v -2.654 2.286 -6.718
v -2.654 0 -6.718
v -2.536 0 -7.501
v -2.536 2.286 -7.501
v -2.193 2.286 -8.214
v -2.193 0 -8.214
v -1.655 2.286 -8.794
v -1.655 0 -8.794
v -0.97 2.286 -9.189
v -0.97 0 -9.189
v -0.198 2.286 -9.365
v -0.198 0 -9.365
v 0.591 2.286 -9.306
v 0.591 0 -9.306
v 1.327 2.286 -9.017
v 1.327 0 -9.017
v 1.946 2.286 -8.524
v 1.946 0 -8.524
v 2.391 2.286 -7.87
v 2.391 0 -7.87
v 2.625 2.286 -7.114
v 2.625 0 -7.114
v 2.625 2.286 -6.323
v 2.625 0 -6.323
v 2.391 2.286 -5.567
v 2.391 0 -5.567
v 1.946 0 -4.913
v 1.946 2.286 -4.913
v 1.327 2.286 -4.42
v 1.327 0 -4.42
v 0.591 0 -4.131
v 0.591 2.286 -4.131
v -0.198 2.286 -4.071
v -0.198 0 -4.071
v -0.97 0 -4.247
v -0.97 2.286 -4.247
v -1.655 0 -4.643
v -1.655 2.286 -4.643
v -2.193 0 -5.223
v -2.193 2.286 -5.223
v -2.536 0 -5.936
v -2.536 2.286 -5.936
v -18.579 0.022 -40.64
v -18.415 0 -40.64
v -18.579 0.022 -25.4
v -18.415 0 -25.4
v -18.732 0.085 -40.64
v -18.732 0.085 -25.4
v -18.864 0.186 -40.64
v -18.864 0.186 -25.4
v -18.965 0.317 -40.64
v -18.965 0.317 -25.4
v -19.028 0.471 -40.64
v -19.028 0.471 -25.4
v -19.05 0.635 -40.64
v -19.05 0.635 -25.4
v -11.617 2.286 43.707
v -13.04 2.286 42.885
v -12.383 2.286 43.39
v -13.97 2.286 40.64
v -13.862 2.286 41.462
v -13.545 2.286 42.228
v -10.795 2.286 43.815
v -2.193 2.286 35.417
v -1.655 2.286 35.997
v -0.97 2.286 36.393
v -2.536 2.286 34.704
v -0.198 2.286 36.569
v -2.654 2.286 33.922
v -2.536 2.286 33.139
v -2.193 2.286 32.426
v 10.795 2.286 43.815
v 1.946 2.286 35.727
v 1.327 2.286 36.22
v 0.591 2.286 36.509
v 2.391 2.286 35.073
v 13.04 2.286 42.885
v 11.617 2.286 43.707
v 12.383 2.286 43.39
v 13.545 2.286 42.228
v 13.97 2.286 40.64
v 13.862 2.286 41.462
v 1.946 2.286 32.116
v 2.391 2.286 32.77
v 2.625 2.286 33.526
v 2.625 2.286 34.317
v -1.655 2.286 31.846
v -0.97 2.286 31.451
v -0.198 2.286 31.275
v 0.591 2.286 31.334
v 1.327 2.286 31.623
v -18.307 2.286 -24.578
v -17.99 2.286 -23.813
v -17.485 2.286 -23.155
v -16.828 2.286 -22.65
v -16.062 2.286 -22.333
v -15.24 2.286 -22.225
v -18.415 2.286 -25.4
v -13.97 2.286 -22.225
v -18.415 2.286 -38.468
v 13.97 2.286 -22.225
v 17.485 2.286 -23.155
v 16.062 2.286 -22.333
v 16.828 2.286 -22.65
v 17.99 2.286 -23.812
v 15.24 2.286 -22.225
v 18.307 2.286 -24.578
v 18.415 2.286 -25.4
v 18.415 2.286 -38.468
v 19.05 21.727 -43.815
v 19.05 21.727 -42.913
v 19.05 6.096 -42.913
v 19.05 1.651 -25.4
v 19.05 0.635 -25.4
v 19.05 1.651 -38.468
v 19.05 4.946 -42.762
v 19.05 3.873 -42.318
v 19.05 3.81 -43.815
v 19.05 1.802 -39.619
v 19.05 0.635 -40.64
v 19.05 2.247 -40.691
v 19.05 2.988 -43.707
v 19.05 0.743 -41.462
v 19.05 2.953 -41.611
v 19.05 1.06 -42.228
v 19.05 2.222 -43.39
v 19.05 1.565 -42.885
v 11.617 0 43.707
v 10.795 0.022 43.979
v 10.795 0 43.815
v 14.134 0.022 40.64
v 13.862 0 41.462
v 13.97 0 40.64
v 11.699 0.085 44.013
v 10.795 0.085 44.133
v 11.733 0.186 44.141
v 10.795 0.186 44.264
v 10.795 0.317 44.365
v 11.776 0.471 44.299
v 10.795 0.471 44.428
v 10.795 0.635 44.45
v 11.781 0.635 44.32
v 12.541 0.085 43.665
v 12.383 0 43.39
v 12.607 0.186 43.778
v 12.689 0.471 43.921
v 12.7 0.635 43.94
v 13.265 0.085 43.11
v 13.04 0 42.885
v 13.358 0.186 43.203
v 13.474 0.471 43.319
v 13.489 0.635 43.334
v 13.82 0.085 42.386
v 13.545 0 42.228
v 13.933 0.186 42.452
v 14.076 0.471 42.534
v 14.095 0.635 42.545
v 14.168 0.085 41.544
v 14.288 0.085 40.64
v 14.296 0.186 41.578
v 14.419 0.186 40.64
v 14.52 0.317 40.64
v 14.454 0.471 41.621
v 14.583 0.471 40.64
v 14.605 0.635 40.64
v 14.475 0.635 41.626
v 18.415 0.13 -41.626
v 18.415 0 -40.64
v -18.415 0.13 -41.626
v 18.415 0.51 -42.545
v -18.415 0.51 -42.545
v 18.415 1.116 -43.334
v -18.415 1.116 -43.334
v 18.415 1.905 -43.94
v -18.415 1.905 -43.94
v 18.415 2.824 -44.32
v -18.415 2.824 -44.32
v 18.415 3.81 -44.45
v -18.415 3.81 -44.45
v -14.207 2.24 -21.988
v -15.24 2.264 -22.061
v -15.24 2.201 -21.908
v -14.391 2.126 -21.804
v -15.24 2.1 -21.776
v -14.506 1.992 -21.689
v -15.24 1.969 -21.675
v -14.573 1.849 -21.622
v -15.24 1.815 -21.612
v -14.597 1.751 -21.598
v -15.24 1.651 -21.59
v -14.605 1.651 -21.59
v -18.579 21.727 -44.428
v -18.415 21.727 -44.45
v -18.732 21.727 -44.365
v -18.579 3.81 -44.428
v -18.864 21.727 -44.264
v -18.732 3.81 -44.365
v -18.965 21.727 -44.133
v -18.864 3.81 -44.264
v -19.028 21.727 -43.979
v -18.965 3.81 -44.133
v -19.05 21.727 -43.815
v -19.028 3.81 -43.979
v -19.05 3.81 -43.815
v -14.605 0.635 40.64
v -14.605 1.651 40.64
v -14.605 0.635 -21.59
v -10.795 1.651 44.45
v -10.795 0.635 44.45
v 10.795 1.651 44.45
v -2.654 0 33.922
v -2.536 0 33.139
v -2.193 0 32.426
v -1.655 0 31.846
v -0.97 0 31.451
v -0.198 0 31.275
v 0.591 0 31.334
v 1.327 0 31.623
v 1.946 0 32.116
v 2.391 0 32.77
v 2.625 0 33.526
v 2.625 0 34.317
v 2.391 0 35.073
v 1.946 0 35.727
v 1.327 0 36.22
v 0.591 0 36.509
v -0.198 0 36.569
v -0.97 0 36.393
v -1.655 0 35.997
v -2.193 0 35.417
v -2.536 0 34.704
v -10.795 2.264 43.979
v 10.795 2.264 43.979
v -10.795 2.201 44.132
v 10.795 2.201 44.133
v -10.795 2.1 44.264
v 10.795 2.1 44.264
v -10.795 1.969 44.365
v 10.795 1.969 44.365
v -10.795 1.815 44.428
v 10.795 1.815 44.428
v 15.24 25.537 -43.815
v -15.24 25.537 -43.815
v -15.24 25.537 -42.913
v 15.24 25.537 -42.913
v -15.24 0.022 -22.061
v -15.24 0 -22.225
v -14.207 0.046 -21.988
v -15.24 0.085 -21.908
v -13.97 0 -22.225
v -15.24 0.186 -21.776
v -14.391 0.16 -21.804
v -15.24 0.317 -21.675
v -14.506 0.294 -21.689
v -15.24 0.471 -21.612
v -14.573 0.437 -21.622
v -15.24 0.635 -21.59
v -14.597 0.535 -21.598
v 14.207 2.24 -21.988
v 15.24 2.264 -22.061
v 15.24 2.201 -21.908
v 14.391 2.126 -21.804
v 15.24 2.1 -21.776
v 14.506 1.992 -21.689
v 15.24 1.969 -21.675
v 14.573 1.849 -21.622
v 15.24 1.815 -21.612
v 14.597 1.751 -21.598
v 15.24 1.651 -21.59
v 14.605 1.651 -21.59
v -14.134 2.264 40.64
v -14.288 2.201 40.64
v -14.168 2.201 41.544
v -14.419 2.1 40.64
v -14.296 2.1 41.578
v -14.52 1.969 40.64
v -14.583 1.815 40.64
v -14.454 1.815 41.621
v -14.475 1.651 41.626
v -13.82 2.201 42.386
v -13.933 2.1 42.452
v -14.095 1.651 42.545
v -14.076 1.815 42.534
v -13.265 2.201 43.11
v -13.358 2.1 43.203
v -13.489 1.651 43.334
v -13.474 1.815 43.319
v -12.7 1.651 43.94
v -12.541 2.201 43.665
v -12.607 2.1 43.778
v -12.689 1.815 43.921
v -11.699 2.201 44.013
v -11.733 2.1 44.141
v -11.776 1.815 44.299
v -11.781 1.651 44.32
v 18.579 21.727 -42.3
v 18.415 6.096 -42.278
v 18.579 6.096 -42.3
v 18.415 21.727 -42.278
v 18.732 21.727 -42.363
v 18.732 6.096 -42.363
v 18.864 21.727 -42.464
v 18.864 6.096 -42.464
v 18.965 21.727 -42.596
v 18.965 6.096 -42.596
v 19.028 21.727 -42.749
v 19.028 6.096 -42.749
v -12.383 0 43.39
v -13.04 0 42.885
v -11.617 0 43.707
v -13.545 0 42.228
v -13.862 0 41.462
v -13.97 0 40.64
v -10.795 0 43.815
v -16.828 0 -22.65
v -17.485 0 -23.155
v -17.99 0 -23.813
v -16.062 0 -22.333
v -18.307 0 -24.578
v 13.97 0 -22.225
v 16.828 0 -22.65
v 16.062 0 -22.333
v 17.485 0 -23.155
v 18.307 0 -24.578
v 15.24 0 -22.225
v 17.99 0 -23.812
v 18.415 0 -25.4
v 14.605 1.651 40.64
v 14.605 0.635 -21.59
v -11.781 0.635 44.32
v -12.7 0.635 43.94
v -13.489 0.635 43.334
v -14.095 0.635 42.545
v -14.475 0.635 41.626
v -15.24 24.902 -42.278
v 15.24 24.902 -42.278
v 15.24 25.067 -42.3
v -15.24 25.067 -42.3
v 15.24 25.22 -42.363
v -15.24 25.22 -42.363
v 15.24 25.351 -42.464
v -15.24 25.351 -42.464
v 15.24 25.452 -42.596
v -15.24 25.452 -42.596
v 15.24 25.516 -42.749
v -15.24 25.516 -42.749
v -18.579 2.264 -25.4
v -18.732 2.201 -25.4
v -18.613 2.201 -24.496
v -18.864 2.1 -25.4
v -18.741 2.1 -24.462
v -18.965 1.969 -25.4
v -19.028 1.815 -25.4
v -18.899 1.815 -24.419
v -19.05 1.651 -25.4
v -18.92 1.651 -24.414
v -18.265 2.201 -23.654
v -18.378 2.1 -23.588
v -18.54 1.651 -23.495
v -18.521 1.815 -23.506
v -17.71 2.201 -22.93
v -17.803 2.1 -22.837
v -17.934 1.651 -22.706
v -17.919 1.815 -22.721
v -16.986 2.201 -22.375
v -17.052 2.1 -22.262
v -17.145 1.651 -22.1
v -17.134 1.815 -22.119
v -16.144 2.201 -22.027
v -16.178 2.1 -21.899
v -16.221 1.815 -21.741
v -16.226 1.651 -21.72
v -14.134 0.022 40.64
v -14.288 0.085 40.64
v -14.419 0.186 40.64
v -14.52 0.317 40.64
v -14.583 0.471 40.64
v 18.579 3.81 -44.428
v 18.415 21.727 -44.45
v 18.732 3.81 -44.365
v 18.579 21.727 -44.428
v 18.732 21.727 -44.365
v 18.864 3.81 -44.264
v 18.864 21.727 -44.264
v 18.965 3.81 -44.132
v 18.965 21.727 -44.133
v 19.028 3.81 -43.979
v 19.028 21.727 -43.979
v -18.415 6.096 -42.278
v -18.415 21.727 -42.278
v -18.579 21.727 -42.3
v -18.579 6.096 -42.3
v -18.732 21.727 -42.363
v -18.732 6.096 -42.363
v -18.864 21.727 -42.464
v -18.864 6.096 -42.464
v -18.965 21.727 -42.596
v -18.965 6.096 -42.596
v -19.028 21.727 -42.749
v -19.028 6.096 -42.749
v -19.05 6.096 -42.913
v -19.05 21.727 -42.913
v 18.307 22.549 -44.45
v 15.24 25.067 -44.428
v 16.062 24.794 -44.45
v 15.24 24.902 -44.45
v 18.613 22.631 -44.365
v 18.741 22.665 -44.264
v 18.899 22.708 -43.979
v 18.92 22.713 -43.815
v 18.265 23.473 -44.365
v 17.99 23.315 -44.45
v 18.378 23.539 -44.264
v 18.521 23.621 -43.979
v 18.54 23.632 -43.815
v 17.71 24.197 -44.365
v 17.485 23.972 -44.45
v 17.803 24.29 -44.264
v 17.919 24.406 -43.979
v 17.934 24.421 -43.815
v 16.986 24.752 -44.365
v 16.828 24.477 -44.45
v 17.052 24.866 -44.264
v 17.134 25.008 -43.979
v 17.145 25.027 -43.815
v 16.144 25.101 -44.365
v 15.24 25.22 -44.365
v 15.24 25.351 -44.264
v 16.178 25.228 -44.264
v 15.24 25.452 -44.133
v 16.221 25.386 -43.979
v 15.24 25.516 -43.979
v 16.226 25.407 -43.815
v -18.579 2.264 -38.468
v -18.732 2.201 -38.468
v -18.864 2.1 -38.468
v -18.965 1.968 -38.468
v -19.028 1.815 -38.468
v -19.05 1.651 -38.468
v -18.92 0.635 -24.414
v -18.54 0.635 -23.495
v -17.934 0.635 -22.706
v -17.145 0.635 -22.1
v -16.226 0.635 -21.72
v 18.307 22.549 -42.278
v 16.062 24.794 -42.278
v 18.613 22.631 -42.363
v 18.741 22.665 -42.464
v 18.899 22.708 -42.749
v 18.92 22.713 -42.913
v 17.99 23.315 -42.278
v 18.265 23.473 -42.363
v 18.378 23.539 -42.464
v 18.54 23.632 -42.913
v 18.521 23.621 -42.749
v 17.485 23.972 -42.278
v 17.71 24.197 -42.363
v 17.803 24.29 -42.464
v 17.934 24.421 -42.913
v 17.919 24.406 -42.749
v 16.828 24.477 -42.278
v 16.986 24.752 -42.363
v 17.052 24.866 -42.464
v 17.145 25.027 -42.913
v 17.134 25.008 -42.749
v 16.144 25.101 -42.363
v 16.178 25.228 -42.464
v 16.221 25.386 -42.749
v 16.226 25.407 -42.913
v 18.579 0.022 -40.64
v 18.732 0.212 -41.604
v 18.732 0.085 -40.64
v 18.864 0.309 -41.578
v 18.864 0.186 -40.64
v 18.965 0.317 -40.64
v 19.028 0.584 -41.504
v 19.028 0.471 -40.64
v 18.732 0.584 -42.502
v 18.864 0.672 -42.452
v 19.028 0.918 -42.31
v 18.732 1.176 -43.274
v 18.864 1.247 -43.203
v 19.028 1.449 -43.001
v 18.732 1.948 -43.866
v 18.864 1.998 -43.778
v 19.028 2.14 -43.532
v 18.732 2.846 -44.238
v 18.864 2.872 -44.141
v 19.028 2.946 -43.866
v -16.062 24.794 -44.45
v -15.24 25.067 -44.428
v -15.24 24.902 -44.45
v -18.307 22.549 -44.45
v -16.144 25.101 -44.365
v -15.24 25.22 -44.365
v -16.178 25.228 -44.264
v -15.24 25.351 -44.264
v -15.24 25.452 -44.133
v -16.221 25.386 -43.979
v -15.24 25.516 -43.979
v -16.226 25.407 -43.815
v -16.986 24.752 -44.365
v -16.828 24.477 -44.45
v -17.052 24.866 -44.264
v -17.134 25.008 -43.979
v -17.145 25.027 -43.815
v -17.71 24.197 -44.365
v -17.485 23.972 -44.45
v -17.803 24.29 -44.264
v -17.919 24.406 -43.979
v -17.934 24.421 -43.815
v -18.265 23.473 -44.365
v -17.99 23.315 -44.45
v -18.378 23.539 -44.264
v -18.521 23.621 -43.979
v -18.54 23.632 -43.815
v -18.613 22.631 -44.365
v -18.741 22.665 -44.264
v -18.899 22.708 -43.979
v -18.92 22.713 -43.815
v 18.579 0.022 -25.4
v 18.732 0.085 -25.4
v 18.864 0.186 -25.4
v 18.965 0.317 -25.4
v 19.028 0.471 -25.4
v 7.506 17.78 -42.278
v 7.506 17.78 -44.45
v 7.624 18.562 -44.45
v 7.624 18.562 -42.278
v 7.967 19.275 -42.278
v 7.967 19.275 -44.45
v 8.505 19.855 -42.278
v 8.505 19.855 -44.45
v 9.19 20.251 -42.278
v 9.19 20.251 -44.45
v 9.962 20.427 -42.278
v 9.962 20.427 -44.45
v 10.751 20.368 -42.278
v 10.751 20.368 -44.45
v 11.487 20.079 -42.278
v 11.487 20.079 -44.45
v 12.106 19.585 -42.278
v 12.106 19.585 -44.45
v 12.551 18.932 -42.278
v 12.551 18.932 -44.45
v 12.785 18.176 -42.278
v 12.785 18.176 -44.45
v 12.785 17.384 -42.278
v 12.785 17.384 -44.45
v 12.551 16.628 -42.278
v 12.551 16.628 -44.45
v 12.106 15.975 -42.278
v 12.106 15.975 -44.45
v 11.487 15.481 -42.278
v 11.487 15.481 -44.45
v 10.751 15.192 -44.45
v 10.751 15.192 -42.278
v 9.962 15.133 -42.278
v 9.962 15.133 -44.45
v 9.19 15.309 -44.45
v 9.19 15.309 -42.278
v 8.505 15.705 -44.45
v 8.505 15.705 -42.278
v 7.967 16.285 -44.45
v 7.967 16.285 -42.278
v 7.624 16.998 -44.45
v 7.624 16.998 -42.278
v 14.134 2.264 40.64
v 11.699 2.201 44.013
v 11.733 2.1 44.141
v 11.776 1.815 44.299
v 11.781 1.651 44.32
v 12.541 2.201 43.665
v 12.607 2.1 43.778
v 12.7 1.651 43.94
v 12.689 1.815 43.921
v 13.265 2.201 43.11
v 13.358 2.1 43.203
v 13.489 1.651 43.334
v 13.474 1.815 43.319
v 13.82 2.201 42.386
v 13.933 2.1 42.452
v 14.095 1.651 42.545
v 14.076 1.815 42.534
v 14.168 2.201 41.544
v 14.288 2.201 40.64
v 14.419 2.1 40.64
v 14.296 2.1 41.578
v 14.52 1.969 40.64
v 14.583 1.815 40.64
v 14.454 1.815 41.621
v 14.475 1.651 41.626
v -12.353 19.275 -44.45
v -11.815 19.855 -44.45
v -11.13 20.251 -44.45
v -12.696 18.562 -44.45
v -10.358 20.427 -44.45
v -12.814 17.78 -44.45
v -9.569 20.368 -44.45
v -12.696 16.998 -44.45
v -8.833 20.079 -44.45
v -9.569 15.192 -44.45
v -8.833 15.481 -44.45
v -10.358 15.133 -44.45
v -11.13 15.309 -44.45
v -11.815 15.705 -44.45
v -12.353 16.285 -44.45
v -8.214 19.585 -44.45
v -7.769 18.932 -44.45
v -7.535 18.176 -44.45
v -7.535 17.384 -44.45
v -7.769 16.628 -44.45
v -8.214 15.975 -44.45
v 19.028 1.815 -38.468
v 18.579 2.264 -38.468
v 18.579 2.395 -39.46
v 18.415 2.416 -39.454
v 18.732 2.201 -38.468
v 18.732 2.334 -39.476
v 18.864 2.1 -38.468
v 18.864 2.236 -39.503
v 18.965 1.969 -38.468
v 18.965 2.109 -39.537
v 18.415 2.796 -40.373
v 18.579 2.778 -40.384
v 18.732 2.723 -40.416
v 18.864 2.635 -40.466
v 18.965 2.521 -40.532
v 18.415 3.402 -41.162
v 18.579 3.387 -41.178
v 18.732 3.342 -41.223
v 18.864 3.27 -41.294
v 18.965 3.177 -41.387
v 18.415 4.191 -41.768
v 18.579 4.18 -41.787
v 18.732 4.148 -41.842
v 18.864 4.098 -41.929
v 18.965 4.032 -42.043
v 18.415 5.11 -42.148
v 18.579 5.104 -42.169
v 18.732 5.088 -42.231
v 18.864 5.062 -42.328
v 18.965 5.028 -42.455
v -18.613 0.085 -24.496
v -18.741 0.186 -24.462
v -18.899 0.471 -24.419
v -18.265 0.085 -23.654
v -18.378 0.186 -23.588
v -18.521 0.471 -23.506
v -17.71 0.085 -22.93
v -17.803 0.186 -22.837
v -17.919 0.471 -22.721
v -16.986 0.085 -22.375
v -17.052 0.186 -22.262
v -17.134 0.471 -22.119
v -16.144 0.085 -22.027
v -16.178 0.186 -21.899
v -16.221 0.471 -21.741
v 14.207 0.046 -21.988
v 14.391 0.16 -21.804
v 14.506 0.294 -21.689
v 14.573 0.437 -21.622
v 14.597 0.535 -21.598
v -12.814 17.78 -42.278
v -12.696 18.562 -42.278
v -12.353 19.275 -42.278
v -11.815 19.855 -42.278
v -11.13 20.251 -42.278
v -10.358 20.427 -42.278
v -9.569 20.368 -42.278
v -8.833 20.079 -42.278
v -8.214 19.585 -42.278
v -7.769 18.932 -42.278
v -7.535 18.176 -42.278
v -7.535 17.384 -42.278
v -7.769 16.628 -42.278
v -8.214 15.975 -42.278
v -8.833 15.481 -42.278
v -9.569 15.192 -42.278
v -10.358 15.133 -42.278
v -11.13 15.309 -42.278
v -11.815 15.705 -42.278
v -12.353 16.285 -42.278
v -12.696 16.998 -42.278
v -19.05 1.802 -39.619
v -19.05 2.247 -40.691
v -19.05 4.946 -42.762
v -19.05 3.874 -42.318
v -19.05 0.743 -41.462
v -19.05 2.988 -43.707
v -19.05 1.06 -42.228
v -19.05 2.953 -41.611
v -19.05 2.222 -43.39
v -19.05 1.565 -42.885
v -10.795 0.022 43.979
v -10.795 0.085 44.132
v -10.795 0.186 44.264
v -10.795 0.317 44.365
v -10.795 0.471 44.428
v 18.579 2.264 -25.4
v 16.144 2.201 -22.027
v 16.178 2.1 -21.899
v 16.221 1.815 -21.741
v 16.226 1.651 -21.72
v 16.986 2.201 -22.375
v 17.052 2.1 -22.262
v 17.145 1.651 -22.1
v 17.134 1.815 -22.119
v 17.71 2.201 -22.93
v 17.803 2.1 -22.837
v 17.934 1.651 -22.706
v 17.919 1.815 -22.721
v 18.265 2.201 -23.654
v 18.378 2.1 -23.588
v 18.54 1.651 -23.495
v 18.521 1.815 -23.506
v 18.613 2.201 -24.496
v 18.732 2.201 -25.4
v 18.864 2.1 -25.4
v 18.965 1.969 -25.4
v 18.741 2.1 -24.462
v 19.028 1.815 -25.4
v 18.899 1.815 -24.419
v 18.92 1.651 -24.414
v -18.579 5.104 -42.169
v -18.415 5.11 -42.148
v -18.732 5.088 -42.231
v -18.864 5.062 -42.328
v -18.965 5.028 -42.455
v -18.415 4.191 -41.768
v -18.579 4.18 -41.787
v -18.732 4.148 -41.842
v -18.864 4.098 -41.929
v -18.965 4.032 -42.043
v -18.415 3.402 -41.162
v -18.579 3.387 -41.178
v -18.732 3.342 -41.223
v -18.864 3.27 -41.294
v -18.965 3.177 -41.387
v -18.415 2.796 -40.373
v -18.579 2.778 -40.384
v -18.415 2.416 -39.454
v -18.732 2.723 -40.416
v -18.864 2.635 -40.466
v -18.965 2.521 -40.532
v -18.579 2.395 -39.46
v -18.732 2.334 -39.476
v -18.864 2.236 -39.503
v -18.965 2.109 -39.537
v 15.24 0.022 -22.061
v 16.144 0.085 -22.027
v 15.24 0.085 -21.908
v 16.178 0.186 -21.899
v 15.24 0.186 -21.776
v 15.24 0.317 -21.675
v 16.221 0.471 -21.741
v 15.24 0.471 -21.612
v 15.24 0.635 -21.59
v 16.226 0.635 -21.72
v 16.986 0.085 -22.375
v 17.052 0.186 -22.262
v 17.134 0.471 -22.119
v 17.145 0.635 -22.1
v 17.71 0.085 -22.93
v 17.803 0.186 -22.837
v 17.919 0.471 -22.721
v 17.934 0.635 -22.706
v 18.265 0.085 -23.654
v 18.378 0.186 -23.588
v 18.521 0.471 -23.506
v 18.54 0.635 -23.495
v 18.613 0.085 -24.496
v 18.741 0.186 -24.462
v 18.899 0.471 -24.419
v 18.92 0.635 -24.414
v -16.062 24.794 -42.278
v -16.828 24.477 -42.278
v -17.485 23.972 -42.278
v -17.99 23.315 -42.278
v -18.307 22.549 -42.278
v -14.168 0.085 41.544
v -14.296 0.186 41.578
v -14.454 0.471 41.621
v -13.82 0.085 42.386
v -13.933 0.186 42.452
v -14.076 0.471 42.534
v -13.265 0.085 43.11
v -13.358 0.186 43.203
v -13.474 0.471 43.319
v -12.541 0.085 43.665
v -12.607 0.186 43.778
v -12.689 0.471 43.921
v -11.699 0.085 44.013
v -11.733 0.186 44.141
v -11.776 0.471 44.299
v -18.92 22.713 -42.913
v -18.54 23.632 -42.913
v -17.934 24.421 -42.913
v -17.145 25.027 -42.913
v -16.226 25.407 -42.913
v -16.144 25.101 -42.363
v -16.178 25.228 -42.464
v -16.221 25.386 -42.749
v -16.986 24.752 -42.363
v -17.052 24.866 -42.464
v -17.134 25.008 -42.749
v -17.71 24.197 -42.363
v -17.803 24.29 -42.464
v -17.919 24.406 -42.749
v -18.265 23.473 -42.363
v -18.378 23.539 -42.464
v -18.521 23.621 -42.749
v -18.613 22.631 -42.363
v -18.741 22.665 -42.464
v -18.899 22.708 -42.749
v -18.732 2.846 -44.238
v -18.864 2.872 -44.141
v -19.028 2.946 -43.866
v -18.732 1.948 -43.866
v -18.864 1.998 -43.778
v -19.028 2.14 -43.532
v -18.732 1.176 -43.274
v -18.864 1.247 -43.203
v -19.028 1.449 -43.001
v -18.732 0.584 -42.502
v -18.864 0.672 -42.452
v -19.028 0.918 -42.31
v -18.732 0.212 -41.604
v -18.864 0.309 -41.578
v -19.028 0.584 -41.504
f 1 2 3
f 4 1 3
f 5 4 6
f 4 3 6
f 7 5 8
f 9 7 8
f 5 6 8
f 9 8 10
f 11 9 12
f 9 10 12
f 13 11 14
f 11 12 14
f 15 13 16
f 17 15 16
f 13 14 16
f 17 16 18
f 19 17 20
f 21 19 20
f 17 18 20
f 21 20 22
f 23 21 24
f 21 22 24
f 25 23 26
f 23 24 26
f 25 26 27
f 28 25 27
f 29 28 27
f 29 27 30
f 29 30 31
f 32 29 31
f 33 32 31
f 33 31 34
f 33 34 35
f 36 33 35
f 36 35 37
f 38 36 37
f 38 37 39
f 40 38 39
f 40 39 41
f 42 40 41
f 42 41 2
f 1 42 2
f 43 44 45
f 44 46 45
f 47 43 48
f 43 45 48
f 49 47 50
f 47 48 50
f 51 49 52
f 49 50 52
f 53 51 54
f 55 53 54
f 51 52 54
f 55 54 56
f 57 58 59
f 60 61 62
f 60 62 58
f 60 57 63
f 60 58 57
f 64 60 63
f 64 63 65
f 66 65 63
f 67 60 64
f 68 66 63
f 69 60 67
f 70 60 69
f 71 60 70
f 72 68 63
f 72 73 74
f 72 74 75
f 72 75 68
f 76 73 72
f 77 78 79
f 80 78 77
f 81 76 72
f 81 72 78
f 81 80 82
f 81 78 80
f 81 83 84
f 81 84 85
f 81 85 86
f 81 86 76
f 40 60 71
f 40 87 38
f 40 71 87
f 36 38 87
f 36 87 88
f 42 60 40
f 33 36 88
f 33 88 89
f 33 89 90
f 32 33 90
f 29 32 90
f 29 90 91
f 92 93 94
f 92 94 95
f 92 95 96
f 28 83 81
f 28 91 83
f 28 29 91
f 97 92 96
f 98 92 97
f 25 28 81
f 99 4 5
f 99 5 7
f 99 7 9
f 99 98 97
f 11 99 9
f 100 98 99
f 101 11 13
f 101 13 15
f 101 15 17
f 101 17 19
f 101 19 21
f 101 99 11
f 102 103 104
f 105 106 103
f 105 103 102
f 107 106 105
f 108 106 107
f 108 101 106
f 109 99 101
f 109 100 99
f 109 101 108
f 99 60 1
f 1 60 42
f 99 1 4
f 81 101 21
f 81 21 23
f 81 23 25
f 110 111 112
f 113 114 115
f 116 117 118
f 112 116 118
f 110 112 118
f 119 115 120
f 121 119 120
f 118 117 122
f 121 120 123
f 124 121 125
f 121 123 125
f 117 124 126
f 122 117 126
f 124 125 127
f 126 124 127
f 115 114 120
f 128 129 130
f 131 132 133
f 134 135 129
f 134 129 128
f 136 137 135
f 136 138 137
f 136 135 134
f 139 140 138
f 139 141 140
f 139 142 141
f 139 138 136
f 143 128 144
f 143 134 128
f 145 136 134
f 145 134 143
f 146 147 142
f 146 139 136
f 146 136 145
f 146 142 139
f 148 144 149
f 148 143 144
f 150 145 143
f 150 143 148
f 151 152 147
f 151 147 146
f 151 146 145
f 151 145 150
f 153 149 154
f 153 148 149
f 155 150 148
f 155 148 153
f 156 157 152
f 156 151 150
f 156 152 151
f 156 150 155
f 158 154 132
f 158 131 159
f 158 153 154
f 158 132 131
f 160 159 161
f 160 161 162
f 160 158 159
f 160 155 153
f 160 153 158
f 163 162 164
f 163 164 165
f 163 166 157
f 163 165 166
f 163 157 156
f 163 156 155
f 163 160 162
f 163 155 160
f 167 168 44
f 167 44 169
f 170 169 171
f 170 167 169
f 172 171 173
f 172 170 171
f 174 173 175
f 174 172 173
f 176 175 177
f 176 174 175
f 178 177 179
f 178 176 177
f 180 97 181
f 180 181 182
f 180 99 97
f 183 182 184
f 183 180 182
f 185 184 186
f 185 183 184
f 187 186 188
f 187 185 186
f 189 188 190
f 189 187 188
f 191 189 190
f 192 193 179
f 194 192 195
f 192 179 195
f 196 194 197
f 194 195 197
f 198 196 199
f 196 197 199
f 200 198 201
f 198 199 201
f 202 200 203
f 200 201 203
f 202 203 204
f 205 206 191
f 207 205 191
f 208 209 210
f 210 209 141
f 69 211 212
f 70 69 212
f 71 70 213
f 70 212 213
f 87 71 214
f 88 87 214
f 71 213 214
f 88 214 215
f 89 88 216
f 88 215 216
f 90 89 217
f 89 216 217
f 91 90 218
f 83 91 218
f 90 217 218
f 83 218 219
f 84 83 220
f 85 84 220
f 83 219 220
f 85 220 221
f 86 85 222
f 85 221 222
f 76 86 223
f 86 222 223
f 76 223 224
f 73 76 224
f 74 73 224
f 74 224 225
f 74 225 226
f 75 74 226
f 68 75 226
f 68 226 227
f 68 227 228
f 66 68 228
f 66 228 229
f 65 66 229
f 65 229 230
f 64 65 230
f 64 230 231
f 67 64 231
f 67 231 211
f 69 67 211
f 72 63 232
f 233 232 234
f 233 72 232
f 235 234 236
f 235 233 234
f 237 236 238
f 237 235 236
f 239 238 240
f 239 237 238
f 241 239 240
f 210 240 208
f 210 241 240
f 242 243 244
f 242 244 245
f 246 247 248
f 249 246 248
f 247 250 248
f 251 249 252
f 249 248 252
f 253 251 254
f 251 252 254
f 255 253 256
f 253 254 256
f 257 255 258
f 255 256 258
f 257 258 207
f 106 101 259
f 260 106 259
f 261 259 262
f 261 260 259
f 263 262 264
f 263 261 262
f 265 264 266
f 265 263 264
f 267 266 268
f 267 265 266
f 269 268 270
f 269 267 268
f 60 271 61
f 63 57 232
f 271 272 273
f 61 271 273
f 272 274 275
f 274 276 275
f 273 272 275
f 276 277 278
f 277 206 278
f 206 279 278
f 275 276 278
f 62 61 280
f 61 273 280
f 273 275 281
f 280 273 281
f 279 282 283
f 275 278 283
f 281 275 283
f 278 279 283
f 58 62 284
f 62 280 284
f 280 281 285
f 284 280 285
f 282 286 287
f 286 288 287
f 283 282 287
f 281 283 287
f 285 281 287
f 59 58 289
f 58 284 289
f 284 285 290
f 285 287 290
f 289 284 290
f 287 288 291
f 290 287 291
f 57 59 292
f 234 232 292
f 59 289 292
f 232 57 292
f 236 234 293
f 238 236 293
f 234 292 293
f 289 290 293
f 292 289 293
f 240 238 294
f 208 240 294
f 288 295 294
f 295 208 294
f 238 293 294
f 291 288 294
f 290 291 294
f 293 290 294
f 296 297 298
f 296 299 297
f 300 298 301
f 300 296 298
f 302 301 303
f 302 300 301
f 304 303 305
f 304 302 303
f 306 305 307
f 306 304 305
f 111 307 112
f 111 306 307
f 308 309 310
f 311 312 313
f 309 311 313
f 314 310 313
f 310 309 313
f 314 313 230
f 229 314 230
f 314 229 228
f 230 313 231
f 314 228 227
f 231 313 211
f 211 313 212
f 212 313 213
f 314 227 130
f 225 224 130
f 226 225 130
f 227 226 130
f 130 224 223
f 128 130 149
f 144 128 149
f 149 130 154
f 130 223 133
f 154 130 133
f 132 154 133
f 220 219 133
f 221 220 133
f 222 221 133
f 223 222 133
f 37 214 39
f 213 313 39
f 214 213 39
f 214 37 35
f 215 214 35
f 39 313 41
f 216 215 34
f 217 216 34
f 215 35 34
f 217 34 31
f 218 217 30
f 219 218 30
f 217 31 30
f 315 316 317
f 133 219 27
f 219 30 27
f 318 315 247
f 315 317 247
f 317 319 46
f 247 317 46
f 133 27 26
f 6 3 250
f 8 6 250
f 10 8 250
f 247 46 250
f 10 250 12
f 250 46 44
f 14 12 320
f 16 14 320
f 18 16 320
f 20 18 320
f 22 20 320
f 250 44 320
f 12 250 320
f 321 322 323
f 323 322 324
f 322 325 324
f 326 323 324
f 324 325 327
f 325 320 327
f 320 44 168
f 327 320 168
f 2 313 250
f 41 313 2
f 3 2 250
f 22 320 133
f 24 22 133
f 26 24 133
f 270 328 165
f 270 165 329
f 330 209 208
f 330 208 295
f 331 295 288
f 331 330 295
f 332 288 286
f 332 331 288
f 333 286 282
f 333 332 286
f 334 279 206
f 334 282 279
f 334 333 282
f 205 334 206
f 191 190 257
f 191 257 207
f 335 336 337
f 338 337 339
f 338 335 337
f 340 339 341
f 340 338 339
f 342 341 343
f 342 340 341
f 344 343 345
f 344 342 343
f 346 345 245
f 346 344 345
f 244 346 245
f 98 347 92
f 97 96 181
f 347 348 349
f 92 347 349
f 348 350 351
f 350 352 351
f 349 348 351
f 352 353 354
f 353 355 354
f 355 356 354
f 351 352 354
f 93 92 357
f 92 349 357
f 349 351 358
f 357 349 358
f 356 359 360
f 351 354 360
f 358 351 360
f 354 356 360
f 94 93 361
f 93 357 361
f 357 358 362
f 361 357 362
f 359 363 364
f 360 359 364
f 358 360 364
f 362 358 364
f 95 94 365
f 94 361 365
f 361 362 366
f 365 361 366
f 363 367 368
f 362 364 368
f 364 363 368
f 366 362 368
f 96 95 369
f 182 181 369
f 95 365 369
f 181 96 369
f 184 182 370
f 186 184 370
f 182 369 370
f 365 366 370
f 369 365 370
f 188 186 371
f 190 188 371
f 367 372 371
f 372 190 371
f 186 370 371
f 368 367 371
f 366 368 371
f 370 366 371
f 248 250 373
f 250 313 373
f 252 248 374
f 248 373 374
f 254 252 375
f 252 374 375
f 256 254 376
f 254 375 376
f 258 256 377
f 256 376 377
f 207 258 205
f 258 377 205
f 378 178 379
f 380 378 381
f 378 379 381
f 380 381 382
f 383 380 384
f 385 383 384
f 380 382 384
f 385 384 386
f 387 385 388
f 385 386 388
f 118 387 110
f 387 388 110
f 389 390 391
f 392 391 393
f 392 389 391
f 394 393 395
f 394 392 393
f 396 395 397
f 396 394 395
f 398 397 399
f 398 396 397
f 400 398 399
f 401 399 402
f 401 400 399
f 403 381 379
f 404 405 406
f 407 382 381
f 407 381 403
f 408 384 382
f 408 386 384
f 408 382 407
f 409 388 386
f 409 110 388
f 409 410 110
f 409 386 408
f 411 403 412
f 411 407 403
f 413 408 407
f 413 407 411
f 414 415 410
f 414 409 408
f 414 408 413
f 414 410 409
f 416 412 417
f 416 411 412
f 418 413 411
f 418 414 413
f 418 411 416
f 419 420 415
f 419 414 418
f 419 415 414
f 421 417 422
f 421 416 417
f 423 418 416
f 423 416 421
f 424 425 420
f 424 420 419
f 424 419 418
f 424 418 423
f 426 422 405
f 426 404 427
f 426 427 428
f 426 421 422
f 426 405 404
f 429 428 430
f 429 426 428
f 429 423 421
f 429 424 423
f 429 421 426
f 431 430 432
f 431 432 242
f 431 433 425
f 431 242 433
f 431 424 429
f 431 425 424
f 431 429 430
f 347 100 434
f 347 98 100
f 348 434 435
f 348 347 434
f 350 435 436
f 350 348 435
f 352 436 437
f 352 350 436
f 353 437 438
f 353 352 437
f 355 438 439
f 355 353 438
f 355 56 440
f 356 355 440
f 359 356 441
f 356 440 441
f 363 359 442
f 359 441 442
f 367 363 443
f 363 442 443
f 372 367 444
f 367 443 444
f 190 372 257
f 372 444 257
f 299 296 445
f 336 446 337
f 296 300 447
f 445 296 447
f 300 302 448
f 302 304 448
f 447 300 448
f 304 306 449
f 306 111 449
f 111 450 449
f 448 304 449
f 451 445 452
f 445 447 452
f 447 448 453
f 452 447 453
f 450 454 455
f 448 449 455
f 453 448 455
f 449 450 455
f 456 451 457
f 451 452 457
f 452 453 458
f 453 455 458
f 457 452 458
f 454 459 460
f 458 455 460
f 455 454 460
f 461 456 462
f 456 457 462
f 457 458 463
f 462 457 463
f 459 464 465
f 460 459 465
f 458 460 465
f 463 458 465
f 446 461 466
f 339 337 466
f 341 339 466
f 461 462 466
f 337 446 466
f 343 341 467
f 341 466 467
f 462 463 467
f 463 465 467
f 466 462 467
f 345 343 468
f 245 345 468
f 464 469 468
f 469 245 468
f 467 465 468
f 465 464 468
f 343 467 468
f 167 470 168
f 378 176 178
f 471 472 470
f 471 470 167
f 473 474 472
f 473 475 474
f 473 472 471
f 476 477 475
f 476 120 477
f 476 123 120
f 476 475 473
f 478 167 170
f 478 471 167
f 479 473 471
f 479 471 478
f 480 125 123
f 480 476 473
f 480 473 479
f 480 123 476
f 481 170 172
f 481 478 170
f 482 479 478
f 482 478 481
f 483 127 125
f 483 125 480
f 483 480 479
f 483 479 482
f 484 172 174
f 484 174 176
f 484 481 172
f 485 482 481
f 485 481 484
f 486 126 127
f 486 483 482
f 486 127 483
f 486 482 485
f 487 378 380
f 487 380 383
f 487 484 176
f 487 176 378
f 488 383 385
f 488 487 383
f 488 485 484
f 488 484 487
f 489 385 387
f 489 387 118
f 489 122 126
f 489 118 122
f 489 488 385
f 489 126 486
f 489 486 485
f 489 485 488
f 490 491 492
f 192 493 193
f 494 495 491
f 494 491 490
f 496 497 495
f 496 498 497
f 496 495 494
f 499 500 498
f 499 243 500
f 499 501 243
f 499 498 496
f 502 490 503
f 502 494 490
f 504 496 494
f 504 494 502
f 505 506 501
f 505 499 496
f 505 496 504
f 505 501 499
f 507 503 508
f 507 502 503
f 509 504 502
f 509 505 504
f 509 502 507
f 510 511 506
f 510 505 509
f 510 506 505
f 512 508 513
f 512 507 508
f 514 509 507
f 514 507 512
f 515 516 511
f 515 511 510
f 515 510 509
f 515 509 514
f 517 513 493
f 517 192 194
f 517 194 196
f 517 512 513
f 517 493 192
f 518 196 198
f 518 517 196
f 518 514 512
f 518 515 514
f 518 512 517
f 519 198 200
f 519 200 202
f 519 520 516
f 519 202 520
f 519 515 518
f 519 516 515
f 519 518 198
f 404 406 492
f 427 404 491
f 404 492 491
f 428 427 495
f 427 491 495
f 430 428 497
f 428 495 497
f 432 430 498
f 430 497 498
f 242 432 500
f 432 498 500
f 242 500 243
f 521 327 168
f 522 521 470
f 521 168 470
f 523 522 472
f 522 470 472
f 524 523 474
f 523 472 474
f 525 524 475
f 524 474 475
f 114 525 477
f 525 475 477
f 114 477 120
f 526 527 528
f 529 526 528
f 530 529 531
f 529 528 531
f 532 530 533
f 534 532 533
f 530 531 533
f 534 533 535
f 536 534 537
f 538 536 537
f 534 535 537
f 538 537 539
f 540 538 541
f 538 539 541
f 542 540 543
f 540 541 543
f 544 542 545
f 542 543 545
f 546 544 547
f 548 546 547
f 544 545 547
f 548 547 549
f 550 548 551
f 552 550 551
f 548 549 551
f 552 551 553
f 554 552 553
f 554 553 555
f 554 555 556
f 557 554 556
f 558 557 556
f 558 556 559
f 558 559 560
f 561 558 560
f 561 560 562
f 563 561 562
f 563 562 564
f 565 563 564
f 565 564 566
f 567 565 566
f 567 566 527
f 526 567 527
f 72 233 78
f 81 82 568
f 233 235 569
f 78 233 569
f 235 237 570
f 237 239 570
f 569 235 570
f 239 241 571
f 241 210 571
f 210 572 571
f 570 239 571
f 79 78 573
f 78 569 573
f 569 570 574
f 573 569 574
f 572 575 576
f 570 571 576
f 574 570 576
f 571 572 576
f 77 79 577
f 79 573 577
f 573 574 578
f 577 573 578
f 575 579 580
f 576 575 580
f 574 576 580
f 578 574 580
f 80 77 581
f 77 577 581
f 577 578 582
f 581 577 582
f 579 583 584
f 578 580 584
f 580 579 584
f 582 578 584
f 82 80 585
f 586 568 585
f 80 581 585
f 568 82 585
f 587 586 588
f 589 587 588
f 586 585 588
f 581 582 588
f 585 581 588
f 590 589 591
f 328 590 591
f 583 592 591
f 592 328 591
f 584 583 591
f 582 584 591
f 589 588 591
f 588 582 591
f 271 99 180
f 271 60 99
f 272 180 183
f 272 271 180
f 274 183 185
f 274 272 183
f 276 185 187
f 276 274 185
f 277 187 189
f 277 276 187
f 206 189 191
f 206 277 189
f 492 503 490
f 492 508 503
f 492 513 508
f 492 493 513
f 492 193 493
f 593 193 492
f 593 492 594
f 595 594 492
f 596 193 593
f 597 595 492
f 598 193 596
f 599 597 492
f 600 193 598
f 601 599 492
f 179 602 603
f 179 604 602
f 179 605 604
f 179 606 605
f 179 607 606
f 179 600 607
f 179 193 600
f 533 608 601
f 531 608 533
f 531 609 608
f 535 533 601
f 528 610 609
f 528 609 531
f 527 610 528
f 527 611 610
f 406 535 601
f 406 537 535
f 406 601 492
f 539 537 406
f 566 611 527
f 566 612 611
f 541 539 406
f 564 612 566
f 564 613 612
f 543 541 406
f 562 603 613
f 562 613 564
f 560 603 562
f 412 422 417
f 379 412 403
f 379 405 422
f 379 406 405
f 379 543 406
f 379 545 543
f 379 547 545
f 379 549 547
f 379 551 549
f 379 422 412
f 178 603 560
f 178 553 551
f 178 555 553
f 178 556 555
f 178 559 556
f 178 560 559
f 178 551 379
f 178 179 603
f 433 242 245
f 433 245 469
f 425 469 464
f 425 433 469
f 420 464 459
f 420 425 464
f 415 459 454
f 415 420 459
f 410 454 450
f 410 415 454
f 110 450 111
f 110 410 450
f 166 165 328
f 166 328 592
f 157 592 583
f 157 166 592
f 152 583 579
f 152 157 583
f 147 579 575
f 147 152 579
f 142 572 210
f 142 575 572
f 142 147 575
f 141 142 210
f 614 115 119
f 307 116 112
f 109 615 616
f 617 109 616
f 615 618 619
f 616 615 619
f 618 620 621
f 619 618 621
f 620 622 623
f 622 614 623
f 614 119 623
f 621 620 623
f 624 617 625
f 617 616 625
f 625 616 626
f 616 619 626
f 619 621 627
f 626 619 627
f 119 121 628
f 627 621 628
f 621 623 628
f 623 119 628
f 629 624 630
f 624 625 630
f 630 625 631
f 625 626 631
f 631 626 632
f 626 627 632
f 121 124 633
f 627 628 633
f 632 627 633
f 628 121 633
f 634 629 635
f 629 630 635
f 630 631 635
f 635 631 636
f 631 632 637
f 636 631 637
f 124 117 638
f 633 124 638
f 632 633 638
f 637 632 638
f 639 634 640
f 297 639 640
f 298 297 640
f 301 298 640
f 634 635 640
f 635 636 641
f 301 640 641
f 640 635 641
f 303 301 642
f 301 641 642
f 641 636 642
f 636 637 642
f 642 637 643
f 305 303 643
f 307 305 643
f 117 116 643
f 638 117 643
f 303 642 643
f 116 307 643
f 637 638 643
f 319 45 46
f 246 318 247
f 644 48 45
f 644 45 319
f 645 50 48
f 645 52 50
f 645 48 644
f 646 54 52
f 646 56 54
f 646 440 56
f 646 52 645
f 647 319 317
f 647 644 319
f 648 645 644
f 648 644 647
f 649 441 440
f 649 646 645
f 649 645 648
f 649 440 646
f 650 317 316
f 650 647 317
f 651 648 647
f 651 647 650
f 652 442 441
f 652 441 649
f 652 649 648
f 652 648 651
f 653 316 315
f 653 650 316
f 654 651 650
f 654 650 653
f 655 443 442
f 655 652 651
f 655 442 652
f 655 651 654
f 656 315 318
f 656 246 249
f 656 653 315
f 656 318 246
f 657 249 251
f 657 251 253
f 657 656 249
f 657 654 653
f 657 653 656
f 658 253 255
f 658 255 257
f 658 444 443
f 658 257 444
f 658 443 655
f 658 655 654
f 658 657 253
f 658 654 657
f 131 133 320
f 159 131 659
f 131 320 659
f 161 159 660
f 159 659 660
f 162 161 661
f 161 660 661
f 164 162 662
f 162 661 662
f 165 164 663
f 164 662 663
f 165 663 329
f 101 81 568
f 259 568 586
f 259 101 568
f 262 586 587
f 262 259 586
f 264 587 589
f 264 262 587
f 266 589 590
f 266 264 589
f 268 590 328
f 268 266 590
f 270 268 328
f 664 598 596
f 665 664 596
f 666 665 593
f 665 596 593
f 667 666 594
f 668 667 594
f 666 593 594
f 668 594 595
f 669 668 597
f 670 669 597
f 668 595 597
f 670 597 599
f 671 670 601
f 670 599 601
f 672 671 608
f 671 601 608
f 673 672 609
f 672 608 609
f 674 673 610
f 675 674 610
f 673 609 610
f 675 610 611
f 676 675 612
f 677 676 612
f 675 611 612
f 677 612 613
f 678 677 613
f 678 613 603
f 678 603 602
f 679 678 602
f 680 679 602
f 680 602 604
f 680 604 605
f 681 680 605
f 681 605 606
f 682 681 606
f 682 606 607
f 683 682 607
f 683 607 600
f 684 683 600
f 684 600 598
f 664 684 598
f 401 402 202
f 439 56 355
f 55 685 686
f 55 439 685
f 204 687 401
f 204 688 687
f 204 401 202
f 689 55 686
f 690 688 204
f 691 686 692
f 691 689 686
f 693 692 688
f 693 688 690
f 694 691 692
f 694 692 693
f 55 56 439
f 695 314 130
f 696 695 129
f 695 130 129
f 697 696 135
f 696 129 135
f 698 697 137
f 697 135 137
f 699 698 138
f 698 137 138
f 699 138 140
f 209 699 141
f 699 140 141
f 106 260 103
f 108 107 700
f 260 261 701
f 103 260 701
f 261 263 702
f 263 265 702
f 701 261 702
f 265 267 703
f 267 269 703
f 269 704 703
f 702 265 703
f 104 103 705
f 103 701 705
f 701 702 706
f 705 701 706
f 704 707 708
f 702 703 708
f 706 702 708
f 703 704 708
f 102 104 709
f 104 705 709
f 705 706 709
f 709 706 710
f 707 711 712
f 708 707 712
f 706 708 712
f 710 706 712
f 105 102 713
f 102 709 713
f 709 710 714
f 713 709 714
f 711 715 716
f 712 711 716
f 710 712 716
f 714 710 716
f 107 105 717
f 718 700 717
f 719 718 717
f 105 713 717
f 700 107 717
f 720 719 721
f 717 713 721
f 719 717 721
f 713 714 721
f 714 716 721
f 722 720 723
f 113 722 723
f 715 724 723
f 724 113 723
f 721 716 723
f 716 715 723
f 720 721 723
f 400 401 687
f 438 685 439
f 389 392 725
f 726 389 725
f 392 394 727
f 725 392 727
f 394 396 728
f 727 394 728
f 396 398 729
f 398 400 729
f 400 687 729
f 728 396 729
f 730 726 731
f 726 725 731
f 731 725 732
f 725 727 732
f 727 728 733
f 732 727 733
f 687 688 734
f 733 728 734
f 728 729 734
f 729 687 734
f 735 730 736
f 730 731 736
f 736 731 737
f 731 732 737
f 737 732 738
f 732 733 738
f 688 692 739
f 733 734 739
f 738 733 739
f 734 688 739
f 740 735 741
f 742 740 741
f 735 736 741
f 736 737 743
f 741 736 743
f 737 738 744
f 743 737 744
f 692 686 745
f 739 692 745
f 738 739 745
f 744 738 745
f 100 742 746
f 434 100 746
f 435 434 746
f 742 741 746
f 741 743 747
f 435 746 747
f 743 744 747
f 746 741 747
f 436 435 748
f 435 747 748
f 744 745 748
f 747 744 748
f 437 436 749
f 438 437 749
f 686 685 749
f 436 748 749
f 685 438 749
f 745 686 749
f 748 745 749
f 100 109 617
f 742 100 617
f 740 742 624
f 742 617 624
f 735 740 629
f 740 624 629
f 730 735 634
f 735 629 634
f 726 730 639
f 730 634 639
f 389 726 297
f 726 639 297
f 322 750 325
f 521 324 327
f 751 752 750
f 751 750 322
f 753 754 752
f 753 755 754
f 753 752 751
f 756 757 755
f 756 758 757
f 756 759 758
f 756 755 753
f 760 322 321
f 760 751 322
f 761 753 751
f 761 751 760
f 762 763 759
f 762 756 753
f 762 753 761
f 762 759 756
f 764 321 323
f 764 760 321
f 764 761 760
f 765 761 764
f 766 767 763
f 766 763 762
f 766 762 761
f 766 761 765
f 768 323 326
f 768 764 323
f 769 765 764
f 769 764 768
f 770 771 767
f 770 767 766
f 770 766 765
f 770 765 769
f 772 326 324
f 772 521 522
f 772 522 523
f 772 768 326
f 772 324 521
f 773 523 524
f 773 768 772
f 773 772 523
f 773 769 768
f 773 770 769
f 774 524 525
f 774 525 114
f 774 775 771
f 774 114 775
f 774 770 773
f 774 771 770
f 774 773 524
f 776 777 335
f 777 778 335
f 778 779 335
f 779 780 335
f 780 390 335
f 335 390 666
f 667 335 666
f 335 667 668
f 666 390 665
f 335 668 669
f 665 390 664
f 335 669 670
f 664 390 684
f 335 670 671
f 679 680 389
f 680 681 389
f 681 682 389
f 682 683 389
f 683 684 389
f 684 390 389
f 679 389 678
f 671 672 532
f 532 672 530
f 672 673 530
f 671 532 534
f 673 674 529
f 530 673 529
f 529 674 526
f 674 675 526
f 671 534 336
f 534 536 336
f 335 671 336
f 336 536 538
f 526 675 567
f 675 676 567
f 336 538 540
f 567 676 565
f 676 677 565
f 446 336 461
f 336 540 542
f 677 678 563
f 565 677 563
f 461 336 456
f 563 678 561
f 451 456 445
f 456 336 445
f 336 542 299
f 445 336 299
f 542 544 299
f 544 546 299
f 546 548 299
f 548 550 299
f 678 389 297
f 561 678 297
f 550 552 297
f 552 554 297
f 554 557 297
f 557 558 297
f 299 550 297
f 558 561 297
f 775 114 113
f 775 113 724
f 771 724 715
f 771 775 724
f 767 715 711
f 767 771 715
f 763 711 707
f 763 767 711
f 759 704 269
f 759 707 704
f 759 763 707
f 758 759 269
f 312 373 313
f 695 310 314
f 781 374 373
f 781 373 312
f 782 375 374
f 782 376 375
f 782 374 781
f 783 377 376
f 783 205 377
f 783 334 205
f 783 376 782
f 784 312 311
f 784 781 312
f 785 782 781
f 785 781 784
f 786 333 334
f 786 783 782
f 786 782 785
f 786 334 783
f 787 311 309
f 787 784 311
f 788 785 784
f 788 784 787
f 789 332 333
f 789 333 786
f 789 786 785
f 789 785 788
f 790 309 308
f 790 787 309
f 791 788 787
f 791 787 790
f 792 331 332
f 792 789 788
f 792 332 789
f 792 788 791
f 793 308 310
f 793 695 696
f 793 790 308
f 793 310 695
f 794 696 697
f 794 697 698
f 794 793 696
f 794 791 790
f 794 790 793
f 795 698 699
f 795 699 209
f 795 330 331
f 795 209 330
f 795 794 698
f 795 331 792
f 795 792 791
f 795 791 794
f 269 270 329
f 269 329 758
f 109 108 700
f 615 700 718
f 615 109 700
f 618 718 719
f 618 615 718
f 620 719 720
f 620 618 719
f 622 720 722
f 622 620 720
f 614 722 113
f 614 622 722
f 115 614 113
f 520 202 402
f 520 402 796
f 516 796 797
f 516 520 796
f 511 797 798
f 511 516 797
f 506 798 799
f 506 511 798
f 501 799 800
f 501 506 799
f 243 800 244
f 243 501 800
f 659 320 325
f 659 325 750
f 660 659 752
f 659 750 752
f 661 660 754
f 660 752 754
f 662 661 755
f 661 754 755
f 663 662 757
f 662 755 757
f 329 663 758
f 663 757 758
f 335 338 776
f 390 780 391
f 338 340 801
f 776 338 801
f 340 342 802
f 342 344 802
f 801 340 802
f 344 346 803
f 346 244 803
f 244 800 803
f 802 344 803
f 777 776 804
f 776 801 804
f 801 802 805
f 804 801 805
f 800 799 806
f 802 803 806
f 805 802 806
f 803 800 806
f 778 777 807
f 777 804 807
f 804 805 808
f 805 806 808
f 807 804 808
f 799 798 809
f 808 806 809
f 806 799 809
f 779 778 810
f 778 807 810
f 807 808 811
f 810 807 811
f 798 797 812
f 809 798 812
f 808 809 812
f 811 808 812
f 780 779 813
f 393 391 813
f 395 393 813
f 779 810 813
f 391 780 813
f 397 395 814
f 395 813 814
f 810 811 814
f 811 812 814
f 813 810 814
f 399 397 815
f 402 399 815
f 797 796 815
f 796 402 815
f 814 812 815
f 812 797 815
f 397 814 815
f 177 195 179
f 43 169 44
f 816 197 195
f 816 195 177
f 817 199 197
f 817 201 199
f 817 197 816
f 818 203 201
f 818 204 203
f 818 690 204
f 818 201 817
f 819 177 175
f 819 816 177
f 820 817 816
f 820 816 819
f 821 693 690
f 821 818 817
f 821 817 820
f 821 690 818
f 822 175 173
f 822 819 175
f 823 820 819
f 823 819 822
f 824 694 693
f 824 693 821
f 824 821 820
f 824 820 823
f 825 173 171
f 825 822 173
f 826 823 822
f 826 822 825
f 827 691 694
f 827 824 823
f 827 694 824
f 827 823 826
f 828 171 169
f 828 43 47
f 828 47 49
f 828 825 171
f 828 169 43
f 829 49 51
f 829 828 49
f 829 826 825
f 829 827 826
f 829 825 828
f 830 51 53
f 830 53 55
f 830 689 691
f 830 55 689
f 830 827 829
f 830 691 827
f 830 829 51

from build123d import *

# Parameters (mm, degrees)
SKETCH1_W                  = 38.1
SKETCH1_H                  = 88.9
BOSS_BASE_DEPTH            = 2.286
SKETCH3_W                  = 38.1
SKETCH3_H                  = 2.1717
BOSS_LIP_DEPTH             = 23.25116
F_4_0_209_DIAMETER_HOLE1_D = 5.3086
F_4_0_209_DIAMETER_HOLE2_D = 5.3086
SKETCH19_W                 = 4.445
SKETCH19_H                 = 66.04
CUT_EXTRUDE1_DEPTH         = 54.659308991
FILLET1_R                  = 3.81
FILLET4_R                  = 0.635


with BuildPart() as part:
    # Sketch1 → Boss-Base (new body)
    with BuildSketch(Plane(origin=(0, 0, 0), x_dir=(1, 0, 0), z_dir=(0, 1, 0))):
        Rectangle(SKETCH1_W, SKETCH1_H)
    extrude(amount=BOSS_BASE_DEPTH)

    # Sketch3 → Boss-Lip (add)
    with BuildSketch(Plane(origin=(0, 2.286, 0), x_dir=(1, 0, 0), z_dir=(0, 1, 0))):
        with Locations((0, 43.36415)):
            Rectangle(SKETCH3_W, SKETCH3_H)
    extrude(amount=BOSS_LIP_DEPTH)

    # #4 (0.209) Diameter Hole1 (through all)
    with Locations(Plane(origin=(0, 2.286, 0), x_dir=(1, 0, 0), z_dir=(0, 1, 0))):
        with Locations((0, -33.9217), (0, 6.7183)):
            Hole(F_4_0_209_DIAMETER_HOLE1_D / 2)

    # #4 (0.209) Diameter Hole2 (through all)
    with Locations(Plane.XY.offset(-42.2783)):
        with Locations((10.16, 17.78), (-10.16, 17.78)):
            Hole(F_4_0_209_DIAMETER_HOLE2_D / 2)

    # Sketch19 → Cut-Extrude1 (cut, through all)
    with BuildSketch(Plane(origin=(0, 2.286, 0), x_dir=(1, 0, 0), z_dir=(0, 1, 0))):
        with Locations((16.8275, -11.43)):
            Rectangle(SKETCH19_W, SKETCH19_H)
        with Locations((-16.8275, -11.43)):
            Rectangle(SKETCH19_W, SKETCH19_H)
    extrude(amount=-CUT_EXTRUDE1_DEPTH, mode=Mode.SUBTRACT)

    # Fillet1
    fillet1_edges = [part.edges().sort_by_distance(p)[0] for p in [
        (0, 2.286, -42.2783),
        (-19.05, 25.53716, -43.36415),
        (19.05, 25.53716, -43.36415),
        (0, 0, -44.45),
        (19.05, 1.143, -21.59),
        (14.605, 1.143, 44.45),
        (-19.05, 1.143, -21.59),
        (-14.605, 1.143, 44.45),
    ]]
    fillet(fillet1_edges, radius=FILLET1_R)

    # Fillet4
    fillet4_edges = [part.edges().sort_by_distance(p)[0] for p in [
        (19.05, 1.115923164, -43.334076836),
        (19.05, 3.401923164, -41.162376836),
        (-19.05, 3.401923164, -41.162376836),
        (14.605, 0, 9.525),
        (14.605, 2.286, 9.525),
        (-14.9225, 0, -21.59),
        (-14.9225, 2.286, -21.59),
        (19.05, 13.91158, -42.2783),
        (0, 25.53716, -42.2783),
        (-19.05, 13.91158, -42.2783),
        (17.934076836, 24.421236836, -42.2783),
        (-17.934076836, 24.421236836, -42.2783),
        (14.9225, 2.286, -21.59),
        (19.05, 2.286, -31.93415),
        (-19.05, 2.286, -31.93415),
        (-14.605, 2.286, 9.525),
        (0, 2.286, 44.45),
        (-17.934076836, 2.286, -22.705923164),
        (17.934076836, 2.286, -22.705923164),
        (13.489076836, 2.286, 43.334076836),
        (-13.489076836, 2.286, 43.334076836),
        (-19.05, 12.76858, -44.45),
        (0, 25.53716, -44.45),
        (19.05, 12.76858, -44.45),
        (17.934076836, 24.421236836, -44.45),
        (-17.934076836, 24.421236836, -44.45),
        (-19.05, 0, -33.02),
        (-19.05, 1.115923164, -43.334076836),
        (14.9225, 0, -21.59),
        (0, 0, 44.45),
        (-14.605, 0, 9.525),
        (19.05, 0, -33.02),
        (-17.934076836, 0, -22.705923164),
        (17.934076836, 0, -22.705923164),
        (13.489076836, 0, 43.334076836),
        (-13.489076836, 0, 43.334076836),
    ]]
    fillet(fillet4_edges, radius=FILLET4_R)


solid = part.part
